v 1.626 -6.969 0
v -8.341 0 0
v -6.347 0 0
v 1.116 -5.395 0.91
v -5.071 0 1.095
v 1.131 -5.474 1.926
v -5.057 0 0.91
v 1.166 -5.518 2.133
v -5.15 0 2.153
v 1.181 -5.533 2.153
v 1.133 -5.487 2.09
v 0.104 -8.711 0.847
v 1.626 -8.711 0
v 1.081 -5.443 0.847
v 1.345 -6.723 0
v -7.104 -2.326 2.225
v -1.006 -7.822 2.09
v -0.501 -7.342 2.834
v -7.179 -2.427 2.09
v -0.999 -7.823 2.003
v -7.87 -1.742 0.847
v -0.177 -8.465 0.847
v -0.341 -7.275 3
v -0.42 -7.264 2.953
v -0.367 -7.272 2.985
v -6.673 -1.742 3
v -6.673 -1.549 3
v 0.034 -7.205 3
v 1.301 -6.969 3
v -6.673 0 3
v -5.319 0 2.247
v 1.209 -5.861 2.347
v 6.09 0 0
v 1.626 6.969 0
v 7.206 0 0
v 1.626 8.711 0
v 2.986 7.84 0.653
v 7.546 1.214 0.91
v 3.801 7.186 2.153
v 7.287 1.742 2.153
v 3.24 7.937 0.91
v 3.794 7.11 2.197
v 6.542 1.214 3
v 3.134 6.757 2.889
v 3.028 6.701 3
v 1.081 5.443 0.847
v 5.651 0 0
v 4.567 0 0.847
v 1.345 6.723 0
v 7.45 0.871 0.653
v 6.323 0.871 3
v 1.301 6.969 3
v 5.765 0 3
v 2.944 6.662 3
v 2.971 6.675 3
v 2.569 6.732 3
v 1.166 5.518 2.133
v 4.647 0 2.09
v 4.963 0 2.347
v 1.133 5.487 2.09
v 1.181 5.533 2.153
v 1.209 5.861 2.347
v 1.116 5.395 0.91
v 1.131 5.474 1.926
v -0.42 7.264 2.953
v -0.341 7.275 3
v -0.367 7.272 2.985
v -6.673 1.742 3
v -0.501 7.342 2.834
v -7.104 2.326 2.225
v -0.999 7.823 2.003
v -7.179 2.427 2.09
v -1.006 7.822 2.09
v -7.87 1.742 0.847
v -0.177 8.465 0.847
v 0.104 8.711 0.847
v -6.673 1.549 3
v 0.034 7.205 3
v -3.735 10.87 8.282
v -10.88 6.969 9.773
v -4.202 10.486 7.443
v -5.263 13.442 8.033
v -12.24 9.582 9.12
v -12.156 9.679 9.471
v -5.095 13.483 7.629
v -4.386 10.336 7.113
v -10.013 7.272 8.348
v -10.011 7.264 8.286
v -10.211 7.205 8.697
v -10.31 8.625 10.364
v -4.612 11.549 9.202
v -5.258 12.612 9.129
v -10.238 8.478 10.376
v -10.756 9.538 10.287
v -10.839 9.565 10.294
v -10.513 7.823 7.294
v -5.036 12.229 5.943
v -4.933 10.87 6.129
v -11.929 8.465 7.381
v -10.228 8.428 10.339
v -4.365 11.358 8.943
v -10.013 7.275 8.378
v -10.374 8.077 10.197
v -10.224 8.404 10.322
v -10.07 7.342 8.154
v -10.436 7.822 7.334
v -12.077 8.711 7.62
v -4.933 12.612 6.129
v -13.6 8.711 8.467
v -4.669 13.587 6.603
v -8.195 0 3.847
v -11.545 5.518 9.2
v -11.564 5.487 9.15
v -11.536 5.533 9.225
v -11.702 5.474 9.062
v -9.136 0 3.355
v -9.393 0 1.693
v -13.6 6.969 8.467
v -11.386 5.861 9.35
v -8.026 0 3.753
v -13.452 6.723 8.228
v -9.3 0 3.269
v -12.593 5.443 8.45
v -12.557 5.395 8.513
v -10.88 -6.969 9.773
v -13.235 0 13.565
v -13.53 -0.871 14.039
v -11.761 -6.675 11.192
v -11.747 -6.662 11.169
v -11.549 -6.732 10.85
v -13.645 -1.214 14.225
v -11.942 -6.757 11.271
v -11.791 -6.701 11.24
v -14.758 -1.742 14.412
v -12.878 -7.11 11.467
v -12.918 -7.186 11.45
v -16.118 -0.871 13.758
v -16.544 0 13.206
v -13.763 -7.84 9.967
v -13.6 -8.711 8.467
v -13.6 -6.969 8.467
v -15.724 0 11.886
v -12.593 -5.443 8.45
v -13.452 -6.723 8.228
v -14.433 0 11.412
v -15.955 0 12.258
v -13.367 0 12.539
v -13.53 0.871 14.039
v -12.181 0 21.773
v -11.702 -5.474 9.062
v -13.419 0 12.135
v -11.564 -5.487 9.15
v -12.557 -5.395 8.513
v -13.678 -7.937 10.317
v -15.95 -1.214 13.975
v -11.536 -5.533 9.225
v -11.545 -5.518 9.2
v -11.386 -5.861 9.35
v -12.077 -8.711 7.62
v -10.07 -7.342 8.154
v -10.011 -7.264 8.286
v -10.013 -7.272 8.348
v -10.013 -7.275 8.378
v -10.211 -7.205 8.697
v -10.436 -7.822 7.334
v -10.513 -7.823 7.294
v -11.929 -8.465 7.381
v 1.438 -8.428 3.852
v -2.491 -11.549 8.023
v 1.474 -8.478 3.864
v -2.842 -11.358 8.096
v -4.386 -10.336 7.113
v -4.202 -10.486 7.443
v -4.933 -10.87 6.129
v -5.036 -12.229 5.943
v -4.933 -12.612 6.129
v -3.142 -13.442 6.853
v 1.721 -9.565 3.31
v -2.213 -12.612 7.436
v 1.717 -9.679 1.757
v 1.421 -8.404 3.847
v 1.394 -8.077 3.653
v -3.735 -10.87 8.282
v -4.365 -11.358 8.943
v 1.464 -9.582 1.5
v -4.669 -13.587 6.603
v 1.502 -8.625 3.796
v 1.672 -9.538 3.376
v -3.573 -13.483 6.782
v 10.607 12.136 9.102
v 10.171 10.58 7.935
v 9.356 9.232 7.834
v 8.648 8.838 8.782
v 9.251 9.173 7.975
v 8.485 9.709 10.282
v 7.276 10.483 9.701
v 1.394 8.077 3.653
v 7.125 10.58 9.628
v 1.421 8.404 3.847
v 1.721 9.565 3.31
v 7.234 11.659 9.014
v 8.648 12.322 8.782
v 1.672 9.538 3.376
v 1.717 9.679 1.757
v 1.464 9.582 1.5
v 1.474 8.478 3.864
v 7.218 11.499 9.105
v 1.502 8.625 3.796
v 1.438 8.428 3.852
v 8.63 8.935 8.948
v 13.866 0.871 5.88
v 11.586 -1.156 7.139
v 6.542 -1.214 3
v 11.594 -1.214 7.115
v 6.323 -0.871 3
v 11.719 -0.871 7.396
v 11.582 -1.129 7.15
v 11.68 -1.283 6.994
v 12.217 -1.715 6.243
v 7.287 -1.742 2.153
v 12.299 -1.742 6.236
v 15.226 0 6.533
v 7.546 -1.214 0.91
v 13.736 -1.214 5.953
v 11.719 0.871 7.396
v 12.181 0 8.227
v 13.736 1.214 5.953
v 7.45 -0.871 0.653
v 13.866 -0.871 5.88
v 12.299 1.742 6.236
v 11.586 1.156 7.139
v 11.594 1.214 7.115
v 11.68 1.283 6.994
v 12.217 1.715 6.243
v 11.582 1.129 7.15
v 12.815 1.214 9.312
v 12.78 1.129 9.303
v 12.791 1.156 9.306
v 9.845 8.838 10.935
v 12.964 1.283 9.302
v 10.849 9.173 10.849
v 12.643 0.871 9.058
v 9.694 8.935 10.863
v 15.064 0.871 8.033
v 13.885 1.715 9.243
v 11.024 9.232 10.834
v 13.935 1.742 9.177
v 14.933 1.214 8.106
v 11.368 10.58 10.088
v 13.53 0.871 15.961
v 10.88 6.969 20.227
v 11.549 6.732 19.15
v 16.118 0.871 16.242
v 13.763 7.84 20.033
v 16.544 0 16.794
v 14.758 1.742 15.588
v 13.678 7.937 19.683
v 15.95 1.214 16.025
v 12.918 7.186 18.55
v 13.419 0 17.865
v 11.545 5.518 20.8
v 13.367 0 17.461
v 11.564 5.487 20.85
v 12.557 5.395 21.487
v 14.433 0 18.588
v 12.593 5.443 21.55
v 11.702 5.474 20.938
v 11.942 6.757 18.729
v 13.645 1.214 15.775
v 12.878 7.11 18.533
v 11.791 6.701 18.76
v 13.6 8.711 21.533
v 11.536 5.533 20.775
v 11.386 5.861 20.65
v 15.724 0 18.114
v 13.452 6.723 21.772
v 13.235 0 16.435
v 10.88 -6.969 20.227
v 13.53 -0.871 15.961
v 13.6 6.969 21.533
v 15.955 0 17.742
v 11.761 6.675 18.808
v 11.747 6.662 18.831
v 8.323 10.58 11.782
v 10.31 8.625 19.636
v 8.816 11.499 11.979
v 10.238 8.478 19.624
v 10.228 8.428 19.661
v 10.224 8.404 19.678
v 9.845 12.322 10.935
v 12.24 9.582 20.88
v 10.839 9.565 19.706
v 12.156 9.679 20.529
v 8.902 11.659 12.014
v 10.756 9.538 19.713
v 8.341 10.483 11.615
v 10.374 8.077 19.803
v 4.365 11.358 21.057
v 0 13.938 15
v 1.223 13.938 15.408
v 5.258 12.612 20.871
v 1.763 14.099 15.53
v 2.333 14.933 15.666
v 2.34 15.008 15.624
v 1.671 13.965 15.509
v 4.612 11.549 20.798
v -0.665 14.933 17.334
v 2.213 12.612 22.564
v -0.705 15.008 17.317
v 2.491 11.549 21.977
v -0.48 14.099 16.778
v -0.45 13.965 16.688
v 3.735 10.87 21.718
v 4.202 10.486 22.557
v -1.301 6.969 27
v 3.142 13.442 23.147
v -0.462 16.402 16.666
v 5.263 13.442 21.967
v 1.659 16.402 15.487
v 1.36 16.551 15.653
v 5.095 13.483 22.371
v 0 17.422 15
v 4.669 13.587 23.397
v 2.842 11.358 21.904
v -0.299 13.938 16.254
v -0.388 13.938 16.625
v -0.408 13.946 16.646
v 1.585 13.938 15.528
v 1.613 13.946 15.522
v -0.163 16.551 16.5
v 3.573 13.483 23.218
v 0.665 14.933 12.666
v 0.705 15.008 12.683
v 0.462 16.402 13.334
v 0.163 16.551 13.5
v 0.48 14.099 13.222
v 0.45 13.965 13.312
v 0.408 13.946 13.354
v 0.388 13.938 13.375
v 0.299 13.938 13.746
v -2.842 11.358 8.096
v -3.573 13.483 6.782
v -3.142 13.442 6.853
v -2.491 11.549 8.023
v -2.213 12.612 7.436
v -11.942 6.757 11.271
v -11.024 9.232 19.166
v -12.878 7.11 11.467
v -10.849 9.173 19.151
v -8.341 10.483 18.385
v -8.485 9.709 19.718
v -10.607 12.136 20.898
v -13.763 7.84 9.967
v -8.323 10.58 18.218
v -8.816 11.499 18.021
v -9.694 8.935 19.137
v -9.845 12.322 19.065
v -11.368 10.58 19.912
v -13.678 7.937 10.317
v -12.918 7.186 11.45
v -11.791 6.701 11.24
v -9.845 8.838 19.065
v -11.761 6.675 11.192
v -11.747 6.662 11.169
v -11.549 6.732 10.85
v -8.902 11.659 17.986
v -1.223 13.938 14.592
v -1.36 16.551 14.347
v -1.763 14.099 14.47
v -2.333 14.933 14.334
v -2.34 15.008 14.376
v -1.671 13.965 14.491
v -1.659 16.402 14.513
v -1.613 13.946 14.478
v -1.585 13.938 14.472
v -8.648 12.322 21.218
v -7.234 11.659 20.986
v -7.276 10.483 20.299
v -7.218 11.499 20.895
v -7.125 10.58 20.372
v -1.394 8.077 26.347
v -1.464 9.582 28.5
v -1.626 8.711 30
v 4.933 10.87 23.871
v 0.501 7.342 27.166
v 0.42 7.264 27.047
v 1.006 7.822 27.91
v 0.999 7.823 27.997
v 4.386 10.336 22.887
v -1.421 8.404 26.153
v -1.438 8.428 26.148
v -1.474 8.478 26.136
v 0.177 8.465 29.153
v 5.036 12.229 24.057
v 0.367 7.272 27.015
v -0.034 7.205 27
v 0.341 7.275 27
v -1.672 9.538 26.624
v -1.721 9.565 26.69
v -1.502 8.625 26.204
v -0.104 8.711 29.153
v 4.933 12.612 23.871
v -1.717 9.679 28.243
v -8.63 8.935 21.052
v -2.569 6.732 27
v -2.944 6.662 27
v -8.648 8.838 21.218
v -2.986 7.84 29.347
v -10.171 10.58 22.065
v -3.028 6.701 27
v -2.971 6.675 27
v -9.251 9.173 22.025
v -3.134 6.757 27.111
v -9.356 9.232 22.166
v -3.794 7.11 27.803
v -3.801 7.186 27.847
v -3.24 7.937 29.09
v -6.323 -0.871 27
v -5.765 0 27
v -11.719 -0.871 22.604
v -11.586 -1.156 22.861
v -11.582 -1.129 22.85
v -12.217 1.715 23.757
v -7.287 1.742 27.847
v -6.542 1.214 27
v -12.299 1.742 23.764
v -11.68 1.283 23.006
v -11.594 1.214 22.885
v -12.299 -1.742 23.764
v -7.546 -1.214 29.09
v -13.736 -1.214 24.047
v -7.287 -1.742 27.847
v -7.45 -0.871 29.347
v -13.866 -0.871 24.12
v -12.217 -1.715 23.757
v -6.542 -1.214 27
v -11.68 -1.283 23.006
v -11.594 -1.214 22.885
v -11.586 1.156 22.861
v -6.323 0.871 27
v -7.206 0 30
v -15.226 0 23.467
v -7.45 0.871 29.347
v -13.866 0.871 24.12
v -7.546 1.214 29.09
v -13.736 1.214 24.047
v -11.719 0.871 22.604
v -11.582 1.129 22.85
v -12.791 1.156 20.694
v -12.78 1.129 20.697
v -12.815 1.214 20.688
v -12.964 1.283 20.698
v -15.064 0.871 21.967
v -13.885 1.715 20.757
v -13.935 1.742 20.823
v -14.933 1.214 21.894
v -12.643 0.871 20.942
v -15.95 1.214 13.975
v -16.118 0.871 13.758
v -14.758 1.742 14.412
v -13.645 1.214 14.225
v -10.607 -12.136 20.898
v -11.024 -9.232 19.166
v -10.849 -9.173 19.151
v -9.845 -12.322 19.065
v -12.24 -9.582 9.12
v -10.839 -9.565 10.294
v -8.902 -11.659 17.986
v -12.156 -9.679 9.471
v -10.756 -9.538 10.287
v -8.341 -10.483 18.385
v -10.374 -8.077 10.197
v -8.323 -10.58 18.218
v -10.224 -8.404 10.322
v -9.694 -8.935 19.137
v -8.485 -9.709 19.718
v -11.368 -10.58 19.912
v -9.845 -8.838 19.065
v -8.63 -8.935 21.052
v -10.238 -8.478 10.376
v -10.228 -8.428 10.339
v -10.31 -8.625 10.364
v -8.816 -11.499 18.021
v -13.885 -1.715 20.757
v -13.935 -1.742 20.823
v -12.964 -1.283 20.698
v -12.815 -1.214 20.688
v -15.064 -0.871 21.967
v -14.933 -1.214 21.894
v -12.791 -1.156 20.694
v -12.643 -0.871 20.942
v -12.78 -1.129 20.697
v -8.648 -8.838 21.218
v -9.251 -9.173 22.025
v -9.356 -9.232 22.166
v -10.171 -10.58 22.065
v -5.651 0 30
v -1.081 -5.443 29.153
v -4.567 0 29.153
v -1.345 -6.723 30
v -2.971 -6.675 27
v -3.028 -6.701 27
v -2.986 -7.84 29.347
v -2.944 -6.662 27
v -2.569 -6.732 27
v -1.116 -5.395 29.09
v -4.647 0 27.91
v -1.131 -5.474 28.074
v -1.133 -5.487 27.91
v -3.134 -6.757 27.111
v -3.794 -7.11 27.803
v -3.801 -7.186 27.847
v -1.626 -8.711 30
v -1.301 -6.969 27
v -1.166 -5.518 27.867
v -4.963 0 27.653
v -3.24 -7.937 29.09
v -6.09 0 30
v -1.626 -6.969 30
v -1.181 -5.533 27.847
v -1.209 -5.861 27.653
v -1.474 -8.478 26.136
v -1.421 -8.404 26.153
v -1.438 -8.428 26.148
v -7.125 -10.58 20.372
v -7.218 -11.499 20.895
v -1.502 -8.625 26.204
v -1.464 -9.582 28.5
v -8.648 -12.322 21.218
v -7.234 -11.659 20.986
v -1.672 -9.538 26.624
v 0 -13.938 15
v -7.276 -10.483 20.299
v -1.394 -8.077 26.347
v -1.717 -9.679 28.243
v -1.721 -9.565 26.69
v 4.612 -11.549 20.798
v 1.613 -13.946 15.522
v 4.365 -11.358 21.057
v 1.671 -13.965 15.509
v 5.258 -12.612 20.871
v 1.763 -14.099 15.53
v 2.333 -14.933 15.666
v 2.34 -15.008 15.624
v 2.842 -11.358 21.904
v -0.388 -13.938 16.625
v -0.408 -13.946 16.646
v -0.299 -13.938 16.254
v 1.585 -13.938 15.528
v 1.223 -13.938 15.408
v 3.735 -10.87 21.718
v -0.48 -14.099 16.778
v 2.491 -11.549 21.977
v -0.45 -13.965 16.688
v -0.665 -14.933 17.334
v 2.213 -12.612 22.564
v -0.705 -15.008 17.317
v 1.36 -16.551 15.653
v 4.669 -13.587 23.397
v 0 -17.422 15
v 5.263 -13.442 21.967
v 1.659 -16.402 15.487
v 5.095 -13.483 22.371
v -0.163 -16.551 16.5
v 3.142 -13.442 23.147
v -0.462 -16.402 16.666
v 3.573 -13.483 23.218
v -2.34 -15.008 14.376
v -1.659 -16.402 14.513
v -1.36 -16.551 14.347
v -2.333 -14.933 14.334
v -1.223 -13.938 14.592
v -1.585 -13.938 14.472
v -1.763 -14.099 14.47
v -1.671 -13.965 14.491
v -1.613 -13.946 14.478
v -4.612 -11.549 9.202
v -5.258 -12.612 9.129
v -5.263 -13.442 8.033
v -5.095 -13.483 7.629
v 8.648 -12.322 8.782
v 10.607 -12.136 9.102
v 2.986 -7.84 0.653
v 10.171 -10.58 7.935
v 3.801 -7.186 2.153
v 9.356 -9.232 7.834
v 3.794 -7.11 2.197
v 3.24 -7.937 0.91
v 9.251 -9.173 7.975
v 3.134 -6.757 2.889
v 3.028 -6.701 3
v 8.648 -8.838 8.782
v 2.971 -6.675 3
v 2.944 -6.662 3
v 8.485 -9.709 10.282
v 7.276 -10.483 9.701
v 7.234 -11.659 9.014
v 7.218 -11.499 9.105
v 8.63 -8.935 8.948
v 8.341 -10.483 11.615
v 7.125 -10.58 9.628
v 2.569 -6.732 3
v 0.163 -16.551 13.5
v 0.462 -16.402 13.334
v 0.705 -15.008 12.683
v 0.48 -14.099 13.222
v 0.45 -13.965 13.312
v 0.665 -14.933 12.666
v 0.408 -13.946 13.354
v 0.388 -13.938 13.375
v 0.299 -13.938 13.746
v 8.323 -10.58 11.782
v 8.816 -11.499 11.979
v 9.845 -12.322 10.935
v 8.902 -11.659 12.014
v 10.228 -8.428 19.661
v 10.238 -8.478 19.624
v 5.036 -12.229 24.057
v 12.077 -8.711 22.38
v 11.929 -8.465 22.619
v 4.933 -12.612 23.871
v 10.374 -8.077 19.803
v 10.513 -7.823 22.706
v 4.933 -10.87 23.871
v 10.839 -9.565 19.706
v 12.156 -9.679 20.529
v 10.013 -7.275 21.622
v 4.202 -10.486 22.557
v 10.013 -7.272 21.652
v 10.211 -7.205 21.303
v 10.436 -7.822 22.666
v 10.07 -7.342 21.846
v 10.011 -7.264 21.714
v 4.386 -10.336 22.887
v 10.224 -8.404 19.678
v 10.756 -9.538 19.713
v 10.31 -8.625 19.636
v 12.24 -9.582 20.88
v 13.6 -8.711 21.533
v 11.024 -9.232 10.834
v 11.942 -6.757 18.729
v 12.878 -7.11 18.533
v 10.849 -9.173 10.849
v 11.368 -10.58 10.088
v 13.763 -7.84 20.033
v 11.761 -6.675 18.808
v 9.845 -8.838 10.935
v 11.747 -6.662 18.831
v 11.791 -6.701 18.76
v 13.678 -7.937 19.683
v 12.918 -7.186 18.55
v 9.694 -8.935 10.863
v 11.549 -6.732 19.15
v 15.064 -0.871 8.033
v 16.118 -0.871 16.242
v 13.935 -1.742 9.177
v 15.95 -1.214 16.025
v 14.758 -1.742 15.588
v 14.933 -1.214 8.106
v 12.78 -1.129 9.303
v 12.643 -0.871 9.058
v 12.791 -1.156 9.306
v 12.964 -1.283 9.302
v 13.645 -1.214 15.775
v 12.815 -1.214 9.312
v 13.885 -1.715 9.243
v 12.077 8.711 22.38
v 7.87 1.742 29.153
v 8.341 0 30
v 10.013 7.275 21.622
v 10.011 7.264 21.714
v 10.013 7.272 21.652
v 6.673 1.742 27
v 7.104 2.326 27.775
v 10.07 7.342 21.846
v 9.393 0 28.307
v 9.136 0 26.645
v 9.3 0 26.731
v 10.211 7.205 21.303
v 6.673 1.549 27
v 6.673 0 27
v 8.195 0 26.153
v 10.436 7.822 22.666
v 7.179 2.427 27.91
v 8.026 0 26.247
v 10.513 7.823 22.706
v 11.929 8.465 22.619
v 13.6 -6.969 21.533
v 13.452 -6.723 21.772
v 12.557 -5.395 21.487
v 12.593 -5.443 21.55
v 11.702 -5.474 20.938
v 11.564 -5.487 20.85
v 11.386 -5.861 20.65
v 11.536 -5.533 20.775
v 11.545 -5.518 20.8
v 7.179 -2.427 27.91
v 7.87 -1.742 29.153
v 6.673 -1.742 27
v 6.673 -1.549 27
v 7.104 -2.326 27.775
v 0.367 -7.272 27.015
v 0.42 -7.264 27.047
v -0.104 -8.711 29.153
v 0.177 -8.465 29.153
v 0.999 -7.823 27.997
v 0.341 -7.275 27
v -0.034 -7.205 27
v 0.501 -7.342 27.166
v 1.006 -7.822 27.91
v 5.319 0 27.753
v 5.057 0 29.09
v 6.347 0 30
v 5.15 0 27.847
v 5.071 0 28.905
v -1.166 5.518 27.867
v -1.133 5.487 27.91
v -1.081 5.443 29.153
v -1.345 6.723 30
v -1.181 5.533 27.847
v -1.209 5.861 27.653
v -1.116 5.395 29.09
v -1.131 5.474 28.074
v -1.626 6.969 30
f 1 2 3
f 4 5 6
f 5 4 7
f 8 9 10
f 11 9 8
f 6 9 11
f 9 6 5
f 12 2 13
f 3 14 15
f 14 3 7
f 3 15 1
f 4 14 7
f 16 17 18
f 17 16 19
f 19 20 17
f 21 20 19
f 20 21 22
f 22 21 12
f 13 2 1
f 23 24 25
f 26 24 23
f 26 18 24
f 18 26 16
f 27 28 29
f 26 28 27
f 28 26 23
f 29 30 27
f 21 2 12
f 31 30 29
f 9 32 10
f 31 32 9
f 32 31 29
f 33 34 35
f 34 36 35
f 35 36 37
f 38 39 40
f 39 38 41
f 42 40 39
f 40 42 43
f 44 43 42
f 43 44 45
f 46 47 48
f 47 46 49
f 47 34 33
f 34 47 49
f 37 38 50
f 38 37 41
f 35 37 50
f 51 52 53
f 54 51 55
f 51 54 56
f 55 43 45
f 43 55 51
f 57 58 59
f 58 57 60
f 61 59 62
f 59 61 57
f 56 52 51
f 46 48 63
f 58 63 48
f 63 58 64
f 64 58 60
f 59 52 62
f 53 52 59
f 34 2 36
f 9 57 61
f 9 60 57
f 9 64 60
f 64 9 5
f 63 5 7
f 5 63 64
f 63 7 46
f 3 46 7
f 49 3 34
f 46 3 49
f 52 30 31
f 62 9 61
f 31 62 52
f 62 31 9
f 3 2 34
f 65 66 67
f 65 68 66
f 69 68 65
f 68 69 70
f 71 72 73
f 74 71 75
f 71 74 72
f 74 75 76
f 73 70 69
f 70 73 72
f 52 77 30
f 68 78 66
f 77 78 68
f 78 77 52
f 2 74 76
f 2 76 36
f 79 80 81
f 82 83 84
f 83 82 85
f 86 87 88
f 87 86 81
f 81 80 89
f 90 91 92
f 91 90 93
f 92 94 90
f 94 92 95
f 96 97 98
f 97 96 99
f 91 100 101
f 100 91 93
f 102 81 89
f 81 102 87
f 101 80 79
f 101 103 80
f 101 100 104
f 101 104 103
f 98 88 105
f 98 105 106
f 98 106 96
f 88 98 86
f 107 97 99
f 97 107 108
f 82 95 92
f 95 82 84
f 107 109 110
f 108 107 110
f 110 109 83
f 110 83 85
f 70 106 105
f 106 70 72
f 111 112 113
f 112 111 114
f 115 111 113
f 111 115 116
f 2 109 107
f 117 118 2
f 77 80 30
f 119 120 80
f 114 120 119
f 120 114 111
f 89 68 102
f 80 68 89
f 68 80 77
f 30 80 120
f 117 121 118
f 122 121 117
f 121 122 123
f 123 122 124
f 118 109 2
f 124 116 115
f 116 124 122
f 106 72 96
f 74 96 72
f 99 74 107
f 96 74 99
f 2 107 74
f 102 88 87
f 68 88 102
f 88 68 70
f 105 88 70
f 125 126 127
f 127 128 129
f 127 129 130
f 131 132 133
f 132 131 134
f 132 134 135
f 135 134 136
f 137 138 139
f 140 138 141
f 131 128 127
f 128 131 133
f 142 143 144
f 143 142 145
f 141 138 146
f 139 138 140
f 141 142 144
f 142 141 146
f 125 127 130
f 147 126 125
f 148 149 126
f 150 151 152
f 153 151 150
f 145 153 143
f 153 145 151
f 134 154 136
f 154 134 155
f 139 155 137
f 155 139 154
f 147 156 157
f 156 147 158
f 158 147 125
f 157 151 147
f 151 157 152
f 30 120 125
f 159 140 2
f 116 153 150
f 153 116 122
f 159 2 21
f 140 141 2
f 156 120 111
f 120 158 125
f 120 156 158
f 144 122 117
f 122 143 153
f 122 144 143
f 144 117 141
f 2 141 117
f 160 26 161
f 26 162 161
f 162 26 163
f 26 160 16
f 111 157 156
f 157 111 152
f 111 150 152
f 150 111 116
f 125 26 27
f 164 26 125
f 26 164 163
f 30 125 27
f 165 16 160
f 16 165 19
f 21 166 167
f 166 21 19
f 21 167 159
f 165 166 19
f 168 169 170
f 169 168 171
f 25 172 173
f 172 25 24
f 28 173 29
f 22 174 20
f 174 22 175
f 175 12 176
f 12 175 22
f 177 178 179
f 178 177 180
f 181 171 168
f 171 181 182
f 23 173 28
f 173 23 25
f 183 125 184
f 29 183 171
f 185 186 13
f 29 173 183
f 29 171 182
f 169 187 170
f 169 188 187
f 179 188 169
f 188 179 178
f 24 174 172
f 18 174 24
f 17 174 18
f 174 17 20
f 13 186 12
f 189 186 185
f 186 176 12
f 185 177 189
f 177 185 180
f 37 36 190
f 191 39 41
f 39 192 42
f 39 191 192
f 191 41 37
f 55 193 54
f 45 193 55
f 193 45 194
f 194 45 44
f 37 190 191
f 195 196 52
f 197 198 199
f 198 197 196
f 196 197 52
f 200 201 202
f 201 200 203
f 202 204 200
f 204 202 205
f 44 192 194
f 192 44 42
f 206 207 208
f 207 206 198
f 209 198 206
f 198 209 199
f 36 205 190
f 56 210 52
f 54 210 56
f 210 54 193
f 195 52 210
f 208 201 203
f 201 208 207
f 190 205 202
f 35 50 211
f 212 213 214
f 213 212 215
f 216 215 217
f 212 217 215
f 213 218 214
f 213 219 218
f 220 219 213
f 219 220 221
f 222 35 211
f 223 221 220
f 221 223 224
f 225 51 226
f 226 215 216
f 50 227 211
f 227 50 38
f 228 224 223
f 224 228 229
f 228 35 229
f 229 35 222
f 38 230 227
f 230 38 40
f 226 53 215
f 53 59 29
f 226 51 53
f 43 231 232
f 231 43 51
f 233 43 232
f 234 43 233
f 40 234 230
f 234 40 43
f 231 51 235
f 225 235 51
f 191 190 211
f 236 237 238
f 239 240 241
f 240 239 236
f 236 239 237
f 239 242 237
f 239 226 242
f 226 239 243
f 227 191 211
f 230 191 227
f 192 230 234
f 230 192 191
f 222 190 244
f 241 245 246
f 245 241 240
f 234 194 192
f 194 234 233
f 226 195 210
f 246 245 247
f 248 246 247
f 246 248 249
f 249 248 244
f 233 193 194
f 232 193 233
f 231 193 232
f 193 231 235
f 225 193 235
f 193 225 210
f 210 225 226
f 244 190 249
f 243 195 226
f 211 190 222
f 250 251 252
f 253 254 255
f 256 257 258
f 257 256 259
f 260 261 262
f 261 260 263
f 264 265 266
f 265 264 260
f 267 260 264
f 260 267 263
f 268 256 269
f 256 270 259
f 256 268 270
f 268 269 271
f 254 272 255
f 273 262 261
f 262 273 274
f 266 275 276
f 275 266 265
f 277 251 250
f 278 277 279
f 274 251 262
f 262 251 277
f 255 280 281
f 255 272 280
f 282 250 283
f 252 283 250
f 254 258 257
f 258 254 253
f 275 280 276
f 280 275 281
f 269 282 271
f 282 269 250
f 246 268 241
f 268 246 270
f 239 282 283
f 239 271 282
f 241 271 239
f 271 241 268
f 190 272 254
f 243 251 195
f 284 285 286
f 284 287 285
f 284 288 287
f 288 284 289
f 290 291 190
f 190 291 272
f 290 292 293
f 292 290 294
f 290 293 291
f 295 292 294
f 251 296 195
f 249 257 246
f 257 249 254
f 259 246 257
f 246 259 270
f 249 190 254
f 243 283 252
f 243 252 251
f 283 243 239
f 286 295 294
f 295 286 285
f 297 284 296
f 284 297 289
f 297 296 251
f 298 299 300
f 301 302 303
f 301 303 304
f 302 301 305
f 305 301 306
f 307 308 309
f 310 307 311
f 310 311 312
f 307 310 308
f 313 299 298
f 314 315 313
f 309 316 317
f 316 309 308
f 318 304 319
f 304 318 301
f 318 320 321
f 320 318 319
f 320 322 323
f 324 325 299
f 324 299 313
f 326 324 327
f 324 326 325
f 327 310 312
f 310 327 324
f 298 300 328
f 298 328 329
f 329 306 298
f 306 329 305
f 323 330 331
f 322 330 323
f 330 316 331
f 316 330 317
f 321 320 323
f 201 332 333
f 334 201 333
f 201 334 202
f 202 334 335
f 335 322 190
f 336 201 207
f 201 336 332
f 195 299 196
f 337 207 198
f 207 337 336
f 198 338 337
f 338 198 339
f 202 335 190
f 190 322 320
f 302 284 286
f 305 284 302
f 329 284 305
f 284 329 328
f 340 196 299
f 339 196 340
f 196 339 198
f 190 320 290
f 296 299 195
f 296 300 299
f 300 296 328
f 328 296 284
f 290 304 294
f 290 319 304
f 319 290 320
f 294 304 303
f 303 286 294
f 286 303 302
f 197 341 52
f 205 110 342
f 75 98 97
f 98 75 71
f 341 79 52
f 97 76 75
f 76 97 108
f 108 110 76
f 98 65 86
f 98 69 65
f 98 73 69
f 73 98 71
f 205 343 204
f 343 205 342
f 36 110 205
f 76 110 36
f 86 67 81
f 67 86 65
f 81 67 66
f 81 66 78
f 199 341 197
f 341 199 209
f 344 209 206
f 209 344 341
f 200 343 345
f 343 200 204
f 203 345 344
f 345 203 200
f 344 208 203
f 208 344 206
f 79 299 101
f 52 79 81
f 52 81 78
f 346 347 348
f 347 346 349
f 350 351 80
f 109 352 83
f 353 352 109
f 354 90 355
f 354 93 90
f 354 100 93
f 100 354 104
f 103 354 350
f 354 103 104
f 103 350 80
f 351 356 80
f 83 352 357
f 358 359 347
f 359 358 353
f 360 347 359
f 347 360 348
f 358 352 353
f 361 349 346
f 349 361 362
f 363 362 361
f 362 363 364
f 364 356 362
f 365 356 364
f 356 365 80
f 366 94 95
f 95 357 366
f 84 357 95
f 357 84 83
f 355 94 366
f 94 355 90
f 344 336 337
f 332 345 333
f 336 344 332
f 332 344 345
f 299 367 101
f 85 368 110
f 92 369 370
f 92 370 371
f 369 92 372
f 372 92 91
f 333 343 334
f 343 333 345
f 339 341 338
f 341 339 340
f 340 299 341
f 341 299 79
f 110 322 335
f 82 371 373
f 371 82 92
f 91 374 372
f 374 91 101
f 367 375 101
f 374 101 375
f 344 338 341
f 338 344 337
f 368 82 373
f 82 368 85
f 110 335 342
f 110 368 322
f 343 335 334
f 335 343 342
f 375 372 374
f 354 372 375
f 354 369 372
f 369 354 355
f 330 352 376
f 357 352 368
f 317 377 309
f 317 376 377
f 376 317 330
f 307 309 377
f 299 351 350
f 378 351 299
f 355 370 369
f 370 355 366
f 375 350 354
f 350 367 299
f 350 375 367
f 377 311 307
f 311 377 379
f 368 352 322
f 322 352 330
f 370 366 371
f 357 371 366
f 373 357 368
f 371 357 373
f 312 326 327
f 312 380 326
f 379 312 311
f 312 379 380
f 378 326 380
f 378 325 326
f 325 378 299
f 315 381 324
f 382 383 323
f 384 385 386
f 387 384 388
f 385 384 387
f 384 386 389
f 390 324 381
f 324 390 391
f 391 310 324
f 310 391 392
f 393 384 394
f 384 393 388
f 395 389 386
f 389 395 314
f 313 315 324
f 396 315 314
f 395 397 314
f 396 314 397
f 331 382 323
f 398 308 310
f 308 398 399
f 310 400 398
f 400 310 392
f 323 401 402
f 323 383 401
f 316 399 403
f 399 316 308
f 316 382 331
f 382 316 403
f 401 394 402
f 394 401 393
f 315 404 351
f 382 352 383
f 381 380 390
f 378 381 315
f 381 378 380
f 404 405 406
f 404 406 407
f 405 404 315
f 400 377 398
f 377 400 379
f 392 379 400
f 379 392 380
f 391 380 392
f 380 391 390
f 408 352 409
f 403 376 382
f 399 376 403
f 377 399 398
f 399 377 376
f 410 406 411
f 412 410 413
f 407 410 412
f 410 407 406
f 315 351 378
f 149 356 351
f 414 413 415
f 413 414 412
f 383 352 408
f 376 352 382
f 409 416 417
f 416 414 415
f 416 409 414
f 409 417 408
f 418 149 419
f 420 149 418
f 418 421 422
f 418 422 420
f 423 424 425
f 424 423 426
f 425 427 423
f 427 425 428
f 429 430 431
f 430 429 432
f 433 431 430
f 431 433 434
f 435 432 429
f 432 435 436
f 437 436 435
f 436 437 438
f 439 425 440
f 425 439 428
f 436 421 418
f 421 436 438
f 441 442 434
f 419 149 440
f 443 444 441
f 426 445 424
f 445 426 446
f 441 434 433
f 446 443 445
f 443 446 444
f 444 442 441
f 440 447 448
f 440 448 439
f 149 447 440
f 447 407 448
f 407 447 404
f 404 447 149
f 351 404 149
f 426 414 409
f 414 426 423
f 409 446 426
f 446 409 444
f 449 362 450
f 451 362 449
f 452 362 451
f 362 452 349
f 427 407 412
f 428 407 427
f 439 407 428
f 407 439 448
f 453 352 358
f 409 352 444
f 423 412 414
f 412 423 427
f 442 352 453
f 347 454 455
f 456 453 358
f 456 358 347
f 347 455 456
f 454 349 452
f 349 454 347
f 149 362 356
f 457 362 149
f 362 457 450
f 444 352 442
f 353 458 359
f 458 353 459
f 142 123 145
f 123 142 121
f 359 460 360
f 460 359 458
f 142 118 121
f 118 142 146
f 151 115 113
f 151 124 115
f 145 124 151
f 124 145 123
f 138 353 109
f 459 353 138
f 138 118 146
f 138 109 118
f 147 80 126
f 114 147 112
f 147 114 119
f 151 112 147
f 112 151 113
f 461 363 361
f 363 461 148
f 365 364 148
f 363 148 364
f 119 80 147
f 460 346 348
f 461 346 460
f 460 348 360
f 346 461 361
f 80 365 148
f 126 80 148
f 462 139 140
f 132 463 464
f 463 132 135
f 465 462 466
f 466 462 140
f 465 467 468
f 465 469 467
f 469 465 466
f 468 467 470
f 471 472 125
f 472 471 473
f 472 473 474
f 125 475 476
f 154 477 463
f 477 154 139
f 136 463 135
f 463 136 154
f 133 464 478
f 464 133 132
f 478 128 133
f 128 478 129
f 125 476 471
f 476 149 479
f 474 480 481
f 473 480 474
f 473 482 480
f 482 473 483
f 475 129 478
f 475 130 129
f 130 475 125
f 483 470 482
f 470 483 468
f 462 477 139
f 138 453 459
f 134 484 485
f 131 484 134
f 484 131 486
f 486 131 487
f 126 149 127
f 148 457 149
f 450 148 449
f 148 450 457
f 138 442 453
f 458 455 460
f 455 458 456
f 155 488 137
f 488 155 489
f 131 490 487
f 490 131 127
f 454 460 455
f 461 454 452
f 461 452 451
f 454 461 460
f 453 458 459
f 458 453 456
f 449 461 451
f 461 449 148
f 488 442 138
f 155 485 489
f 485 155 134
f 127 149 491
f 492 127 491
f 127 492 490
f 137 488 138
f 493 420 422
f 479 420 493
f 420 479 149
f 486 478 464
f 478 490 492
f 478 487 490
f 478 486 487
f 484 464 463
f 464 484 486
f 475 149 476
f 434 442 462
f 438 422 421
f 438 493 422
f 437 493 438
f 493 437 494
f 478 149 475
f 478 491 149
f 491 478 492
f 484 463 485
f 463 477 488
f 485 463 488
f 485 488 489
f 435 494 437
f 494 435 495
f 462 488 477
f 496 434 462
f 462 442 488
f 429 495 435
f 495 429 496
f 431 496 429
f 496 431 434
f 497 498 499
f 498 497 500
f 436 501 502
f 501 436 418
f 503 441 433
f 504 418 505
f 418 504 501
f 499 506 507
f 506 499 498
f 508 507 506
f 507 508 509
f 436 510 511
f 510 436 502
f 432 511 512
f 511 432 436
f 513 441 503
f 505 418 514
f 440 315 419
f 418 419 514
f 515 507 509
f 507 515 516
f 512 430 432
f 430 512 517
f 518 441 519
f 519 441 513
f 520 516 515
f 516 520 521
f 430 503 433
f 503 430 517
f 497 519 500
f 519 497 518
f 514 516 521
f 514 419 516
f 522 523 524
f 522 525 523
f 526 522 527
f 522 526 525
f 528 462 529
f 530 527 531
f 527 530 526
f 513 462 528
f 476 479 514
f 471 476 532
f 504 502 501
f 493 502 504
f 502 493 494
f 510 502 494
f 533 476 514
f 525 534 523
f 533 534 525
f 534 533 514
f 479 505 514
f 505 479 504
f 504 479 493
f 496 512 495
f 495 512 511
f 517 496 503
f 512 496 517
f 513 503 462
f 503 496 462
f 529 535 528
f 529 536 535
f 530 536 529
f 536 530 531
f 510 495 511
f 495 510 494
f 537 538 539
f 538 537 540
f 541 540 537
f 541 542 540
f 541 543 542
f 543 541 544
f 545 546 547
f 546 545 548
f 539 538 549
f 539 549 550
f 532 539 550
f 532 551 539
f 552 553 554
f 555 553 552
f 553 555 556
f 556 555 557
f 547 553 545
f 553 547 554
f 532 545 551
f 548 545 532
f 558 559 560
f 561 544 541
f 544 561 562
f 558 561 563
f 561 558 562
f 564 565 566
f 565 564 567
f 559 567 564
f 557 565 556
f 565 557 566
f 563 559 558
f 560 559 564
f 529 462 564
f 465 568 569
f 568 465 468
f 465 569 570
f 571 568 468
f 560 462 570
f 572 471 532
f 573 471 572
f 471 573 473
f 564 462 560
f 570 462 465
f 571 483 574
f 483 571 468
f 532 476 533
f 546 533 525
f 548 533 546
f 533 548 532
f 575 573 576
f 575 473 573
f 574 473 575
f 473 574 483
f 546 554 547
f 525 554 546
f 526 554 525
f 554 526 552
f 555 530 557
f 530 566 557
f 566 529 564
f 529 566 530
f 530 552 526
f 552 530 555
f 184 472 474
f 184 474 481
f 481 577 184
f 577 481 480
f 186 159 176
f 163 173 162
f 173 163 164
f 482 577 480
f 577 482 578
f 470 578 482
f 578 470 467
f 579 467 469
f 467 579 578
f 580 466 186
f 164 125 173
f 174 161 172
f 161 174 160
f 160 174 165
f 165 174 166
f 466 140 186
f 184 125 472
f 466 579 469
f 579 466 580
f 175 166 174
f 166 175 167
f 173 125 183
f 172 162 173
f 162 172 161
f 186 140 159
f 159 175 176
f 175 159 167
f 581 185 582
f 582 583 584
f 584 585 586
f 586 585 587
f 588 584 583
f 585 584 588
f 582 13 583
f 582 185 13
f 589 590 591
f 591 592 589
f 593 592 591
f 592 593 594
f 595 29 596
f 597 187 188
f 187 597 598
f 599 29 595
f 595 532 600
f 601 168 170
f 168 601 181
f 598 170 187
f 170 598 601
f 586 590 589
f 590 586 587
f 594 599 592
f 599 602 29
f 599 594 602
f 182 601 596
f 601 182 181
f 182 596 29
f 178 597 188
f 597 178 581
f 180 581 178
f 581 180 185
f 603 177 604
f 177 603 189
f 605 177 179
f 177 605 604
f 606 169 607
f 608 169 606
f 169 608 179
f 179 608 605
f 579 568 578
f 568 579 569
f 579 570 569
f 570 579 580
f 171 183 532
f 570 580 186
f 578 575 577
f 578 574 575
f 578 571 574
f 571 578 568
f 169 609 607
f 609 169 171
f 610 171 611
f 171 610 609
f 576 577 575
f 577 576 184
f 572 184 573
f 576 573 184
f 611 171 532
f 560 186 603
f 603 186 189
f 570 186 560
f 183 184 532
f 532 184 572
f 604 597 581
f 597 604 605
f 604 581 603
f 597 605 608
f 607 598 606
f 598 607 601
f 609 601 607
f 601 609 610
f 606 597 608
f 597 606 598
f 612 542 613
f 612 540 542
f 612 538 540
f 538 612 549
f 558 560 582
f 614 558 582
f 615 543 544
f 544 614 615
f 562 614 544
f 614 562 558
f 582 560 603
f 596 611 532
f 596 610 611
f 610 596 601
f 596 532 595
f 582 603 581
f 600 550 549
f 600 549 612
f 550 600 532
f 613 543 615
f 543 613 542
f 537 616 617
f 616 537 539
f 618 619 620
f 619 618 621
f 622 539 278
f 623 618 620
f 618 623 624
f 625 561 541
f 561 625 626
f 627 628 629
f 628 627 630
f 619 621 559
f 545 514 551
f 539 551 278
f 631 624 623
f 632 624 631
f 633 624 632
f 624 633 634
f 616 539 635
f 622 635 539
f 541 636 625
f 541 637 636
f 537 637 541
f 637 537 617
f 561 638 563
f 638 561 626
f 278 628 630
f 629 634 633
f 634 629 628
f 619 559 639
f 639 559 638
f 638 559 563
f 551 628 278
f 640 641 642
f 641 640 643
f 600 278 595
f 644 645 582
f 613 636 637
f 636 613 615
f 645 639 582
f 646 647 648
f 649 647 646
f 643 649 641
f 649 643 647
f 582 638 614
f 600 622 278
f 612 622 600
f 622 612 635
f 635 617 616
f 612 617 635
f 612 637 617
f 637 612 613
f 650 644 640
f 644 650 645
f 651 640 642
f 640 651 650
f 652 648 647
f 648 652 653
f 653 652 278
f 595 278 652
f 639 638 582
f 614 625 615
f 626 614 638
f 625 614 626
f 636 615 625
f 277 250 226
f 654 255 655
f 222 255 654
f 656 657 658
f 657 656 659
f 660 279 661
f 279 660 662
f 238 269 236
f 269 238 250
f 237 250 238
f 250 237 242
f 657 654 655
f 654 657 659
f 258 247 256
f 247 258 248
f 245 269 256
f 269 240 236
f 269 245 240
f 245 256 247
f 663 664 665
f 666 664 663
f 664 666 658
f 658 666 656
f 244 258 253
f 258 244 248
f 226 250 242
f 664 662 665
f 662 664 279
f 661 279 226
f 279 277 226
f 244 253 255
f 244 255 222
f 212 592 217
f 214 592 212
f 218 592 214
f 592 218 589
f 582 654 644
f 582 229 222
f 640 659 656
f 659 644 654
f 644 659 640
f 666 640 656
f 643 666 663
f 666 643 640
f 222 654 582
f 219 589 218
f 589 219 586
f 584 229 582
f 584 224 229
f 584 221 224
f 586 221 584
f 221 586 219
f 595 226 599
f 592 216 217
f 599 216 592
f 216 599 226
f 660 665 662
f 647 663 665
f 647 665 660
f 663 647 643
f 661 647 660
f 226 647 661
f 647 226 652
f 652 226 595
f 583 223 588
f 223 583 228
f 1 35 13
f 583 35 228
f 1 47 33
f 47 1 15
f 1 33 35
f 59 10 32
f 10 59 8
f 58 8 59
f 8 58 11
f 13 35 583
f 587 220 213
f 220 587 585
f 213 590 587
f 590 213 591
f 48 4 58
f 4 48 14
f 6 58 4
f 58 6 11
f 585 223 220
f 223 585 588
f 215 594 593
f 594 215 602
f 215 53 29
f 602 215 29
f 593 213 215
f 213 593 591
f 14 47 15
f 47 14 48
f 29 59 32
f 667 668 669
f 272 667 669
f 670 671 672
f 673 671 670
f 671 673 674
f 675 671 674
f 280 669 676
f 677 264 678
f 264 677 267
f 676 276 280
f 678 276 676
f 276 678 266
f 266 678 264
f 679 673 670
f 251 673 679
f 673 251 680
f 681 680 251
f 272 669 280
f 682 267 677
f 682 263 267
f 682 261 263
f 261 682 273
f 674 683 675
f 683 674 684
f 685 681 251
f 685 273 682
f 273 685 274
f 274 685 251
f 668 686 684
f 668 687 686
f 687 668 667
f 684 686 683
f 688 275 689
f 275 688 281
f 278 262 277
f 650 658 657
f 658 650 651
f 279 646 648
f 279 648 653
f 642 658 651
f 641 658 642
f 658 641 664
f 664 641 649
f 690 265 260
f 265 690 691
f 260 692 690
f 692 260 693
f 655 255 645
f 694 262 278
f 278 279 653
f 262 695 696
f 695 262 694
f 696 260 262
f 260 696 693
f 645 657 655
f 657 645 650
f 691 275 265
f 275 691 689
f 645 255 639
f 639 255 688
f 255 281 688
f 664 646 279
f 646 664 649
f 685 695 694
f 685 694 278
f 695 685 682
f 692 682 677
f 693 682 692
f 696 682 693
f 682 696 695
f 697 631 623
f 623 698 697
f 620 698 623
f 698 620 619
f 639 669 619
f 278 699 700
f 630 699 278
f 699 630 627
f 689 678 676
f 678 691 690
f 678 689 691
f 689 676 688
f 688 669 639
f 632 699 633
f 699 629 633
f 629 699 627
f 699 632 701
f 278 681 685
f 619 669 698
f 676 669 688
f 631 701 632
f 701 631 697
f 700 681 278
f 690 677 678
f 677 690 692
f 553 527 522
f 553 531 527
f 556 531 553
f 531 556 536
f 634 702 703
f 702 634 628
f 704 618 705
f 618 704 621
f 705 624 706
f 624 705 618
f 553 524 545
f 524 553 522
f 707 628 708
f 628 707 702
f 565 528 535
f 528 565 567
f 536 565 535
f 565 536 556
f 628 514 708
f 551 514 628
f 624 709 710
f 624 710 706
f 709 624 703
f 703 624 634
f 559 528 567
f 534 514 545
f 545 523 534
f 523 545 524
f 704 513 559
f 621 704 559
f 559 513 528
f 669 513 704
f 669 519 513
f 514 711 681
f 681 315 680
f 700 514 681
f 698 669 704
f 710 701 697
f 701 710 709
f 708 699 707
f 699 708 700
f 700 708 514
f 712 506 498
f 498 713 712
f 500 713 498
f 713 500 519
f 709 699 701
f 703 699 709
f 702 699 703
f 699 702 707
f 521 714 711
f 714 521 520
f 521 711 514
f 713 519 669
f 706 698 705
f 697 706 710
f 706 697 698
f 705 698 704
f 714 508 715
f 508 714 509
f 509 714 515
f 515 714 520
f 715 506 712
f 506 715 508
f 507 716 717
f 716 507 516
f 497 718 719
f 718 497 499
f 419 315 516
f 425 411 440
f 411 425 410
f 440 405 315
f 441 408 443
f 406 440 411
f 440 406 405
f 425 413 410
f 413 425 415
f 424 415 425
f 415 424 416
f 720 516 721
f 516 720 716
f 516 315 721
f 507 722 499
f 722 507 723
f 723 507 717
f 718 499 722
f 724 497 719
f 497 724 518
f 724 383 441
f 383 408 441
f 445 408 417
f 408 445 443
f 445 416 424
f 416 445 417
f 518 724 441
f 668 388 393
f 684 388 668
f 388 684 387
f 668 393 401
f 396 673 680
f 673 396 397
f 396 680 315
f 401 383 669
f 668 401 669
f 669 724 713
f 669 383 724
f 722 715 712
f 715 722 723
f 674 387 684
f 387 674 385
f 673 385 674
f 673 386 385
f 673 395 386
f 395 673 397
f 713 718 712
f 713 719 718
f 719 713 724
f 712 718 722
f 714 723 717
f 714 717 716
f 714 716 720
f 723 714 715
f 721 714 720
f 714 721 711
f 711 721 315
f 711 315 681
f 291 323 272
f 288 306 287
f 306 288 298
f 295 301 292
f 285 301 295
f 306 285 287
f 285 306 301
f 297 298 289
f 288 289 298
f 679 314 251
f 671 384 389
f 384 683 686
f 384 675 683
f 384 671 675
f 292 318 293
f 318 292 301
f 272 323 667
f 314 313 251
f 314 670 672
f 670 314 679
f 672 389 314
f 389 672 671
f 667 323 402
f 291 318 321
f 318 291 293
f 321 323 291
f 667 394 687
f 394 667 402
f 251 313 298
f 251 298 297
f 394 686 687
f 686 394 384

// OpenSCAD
// shape height
sh = 30;
// border width
bw = 3;

include <../polyhedra.scad>;

poly_wire(deltoidal_icositetrahedron);
